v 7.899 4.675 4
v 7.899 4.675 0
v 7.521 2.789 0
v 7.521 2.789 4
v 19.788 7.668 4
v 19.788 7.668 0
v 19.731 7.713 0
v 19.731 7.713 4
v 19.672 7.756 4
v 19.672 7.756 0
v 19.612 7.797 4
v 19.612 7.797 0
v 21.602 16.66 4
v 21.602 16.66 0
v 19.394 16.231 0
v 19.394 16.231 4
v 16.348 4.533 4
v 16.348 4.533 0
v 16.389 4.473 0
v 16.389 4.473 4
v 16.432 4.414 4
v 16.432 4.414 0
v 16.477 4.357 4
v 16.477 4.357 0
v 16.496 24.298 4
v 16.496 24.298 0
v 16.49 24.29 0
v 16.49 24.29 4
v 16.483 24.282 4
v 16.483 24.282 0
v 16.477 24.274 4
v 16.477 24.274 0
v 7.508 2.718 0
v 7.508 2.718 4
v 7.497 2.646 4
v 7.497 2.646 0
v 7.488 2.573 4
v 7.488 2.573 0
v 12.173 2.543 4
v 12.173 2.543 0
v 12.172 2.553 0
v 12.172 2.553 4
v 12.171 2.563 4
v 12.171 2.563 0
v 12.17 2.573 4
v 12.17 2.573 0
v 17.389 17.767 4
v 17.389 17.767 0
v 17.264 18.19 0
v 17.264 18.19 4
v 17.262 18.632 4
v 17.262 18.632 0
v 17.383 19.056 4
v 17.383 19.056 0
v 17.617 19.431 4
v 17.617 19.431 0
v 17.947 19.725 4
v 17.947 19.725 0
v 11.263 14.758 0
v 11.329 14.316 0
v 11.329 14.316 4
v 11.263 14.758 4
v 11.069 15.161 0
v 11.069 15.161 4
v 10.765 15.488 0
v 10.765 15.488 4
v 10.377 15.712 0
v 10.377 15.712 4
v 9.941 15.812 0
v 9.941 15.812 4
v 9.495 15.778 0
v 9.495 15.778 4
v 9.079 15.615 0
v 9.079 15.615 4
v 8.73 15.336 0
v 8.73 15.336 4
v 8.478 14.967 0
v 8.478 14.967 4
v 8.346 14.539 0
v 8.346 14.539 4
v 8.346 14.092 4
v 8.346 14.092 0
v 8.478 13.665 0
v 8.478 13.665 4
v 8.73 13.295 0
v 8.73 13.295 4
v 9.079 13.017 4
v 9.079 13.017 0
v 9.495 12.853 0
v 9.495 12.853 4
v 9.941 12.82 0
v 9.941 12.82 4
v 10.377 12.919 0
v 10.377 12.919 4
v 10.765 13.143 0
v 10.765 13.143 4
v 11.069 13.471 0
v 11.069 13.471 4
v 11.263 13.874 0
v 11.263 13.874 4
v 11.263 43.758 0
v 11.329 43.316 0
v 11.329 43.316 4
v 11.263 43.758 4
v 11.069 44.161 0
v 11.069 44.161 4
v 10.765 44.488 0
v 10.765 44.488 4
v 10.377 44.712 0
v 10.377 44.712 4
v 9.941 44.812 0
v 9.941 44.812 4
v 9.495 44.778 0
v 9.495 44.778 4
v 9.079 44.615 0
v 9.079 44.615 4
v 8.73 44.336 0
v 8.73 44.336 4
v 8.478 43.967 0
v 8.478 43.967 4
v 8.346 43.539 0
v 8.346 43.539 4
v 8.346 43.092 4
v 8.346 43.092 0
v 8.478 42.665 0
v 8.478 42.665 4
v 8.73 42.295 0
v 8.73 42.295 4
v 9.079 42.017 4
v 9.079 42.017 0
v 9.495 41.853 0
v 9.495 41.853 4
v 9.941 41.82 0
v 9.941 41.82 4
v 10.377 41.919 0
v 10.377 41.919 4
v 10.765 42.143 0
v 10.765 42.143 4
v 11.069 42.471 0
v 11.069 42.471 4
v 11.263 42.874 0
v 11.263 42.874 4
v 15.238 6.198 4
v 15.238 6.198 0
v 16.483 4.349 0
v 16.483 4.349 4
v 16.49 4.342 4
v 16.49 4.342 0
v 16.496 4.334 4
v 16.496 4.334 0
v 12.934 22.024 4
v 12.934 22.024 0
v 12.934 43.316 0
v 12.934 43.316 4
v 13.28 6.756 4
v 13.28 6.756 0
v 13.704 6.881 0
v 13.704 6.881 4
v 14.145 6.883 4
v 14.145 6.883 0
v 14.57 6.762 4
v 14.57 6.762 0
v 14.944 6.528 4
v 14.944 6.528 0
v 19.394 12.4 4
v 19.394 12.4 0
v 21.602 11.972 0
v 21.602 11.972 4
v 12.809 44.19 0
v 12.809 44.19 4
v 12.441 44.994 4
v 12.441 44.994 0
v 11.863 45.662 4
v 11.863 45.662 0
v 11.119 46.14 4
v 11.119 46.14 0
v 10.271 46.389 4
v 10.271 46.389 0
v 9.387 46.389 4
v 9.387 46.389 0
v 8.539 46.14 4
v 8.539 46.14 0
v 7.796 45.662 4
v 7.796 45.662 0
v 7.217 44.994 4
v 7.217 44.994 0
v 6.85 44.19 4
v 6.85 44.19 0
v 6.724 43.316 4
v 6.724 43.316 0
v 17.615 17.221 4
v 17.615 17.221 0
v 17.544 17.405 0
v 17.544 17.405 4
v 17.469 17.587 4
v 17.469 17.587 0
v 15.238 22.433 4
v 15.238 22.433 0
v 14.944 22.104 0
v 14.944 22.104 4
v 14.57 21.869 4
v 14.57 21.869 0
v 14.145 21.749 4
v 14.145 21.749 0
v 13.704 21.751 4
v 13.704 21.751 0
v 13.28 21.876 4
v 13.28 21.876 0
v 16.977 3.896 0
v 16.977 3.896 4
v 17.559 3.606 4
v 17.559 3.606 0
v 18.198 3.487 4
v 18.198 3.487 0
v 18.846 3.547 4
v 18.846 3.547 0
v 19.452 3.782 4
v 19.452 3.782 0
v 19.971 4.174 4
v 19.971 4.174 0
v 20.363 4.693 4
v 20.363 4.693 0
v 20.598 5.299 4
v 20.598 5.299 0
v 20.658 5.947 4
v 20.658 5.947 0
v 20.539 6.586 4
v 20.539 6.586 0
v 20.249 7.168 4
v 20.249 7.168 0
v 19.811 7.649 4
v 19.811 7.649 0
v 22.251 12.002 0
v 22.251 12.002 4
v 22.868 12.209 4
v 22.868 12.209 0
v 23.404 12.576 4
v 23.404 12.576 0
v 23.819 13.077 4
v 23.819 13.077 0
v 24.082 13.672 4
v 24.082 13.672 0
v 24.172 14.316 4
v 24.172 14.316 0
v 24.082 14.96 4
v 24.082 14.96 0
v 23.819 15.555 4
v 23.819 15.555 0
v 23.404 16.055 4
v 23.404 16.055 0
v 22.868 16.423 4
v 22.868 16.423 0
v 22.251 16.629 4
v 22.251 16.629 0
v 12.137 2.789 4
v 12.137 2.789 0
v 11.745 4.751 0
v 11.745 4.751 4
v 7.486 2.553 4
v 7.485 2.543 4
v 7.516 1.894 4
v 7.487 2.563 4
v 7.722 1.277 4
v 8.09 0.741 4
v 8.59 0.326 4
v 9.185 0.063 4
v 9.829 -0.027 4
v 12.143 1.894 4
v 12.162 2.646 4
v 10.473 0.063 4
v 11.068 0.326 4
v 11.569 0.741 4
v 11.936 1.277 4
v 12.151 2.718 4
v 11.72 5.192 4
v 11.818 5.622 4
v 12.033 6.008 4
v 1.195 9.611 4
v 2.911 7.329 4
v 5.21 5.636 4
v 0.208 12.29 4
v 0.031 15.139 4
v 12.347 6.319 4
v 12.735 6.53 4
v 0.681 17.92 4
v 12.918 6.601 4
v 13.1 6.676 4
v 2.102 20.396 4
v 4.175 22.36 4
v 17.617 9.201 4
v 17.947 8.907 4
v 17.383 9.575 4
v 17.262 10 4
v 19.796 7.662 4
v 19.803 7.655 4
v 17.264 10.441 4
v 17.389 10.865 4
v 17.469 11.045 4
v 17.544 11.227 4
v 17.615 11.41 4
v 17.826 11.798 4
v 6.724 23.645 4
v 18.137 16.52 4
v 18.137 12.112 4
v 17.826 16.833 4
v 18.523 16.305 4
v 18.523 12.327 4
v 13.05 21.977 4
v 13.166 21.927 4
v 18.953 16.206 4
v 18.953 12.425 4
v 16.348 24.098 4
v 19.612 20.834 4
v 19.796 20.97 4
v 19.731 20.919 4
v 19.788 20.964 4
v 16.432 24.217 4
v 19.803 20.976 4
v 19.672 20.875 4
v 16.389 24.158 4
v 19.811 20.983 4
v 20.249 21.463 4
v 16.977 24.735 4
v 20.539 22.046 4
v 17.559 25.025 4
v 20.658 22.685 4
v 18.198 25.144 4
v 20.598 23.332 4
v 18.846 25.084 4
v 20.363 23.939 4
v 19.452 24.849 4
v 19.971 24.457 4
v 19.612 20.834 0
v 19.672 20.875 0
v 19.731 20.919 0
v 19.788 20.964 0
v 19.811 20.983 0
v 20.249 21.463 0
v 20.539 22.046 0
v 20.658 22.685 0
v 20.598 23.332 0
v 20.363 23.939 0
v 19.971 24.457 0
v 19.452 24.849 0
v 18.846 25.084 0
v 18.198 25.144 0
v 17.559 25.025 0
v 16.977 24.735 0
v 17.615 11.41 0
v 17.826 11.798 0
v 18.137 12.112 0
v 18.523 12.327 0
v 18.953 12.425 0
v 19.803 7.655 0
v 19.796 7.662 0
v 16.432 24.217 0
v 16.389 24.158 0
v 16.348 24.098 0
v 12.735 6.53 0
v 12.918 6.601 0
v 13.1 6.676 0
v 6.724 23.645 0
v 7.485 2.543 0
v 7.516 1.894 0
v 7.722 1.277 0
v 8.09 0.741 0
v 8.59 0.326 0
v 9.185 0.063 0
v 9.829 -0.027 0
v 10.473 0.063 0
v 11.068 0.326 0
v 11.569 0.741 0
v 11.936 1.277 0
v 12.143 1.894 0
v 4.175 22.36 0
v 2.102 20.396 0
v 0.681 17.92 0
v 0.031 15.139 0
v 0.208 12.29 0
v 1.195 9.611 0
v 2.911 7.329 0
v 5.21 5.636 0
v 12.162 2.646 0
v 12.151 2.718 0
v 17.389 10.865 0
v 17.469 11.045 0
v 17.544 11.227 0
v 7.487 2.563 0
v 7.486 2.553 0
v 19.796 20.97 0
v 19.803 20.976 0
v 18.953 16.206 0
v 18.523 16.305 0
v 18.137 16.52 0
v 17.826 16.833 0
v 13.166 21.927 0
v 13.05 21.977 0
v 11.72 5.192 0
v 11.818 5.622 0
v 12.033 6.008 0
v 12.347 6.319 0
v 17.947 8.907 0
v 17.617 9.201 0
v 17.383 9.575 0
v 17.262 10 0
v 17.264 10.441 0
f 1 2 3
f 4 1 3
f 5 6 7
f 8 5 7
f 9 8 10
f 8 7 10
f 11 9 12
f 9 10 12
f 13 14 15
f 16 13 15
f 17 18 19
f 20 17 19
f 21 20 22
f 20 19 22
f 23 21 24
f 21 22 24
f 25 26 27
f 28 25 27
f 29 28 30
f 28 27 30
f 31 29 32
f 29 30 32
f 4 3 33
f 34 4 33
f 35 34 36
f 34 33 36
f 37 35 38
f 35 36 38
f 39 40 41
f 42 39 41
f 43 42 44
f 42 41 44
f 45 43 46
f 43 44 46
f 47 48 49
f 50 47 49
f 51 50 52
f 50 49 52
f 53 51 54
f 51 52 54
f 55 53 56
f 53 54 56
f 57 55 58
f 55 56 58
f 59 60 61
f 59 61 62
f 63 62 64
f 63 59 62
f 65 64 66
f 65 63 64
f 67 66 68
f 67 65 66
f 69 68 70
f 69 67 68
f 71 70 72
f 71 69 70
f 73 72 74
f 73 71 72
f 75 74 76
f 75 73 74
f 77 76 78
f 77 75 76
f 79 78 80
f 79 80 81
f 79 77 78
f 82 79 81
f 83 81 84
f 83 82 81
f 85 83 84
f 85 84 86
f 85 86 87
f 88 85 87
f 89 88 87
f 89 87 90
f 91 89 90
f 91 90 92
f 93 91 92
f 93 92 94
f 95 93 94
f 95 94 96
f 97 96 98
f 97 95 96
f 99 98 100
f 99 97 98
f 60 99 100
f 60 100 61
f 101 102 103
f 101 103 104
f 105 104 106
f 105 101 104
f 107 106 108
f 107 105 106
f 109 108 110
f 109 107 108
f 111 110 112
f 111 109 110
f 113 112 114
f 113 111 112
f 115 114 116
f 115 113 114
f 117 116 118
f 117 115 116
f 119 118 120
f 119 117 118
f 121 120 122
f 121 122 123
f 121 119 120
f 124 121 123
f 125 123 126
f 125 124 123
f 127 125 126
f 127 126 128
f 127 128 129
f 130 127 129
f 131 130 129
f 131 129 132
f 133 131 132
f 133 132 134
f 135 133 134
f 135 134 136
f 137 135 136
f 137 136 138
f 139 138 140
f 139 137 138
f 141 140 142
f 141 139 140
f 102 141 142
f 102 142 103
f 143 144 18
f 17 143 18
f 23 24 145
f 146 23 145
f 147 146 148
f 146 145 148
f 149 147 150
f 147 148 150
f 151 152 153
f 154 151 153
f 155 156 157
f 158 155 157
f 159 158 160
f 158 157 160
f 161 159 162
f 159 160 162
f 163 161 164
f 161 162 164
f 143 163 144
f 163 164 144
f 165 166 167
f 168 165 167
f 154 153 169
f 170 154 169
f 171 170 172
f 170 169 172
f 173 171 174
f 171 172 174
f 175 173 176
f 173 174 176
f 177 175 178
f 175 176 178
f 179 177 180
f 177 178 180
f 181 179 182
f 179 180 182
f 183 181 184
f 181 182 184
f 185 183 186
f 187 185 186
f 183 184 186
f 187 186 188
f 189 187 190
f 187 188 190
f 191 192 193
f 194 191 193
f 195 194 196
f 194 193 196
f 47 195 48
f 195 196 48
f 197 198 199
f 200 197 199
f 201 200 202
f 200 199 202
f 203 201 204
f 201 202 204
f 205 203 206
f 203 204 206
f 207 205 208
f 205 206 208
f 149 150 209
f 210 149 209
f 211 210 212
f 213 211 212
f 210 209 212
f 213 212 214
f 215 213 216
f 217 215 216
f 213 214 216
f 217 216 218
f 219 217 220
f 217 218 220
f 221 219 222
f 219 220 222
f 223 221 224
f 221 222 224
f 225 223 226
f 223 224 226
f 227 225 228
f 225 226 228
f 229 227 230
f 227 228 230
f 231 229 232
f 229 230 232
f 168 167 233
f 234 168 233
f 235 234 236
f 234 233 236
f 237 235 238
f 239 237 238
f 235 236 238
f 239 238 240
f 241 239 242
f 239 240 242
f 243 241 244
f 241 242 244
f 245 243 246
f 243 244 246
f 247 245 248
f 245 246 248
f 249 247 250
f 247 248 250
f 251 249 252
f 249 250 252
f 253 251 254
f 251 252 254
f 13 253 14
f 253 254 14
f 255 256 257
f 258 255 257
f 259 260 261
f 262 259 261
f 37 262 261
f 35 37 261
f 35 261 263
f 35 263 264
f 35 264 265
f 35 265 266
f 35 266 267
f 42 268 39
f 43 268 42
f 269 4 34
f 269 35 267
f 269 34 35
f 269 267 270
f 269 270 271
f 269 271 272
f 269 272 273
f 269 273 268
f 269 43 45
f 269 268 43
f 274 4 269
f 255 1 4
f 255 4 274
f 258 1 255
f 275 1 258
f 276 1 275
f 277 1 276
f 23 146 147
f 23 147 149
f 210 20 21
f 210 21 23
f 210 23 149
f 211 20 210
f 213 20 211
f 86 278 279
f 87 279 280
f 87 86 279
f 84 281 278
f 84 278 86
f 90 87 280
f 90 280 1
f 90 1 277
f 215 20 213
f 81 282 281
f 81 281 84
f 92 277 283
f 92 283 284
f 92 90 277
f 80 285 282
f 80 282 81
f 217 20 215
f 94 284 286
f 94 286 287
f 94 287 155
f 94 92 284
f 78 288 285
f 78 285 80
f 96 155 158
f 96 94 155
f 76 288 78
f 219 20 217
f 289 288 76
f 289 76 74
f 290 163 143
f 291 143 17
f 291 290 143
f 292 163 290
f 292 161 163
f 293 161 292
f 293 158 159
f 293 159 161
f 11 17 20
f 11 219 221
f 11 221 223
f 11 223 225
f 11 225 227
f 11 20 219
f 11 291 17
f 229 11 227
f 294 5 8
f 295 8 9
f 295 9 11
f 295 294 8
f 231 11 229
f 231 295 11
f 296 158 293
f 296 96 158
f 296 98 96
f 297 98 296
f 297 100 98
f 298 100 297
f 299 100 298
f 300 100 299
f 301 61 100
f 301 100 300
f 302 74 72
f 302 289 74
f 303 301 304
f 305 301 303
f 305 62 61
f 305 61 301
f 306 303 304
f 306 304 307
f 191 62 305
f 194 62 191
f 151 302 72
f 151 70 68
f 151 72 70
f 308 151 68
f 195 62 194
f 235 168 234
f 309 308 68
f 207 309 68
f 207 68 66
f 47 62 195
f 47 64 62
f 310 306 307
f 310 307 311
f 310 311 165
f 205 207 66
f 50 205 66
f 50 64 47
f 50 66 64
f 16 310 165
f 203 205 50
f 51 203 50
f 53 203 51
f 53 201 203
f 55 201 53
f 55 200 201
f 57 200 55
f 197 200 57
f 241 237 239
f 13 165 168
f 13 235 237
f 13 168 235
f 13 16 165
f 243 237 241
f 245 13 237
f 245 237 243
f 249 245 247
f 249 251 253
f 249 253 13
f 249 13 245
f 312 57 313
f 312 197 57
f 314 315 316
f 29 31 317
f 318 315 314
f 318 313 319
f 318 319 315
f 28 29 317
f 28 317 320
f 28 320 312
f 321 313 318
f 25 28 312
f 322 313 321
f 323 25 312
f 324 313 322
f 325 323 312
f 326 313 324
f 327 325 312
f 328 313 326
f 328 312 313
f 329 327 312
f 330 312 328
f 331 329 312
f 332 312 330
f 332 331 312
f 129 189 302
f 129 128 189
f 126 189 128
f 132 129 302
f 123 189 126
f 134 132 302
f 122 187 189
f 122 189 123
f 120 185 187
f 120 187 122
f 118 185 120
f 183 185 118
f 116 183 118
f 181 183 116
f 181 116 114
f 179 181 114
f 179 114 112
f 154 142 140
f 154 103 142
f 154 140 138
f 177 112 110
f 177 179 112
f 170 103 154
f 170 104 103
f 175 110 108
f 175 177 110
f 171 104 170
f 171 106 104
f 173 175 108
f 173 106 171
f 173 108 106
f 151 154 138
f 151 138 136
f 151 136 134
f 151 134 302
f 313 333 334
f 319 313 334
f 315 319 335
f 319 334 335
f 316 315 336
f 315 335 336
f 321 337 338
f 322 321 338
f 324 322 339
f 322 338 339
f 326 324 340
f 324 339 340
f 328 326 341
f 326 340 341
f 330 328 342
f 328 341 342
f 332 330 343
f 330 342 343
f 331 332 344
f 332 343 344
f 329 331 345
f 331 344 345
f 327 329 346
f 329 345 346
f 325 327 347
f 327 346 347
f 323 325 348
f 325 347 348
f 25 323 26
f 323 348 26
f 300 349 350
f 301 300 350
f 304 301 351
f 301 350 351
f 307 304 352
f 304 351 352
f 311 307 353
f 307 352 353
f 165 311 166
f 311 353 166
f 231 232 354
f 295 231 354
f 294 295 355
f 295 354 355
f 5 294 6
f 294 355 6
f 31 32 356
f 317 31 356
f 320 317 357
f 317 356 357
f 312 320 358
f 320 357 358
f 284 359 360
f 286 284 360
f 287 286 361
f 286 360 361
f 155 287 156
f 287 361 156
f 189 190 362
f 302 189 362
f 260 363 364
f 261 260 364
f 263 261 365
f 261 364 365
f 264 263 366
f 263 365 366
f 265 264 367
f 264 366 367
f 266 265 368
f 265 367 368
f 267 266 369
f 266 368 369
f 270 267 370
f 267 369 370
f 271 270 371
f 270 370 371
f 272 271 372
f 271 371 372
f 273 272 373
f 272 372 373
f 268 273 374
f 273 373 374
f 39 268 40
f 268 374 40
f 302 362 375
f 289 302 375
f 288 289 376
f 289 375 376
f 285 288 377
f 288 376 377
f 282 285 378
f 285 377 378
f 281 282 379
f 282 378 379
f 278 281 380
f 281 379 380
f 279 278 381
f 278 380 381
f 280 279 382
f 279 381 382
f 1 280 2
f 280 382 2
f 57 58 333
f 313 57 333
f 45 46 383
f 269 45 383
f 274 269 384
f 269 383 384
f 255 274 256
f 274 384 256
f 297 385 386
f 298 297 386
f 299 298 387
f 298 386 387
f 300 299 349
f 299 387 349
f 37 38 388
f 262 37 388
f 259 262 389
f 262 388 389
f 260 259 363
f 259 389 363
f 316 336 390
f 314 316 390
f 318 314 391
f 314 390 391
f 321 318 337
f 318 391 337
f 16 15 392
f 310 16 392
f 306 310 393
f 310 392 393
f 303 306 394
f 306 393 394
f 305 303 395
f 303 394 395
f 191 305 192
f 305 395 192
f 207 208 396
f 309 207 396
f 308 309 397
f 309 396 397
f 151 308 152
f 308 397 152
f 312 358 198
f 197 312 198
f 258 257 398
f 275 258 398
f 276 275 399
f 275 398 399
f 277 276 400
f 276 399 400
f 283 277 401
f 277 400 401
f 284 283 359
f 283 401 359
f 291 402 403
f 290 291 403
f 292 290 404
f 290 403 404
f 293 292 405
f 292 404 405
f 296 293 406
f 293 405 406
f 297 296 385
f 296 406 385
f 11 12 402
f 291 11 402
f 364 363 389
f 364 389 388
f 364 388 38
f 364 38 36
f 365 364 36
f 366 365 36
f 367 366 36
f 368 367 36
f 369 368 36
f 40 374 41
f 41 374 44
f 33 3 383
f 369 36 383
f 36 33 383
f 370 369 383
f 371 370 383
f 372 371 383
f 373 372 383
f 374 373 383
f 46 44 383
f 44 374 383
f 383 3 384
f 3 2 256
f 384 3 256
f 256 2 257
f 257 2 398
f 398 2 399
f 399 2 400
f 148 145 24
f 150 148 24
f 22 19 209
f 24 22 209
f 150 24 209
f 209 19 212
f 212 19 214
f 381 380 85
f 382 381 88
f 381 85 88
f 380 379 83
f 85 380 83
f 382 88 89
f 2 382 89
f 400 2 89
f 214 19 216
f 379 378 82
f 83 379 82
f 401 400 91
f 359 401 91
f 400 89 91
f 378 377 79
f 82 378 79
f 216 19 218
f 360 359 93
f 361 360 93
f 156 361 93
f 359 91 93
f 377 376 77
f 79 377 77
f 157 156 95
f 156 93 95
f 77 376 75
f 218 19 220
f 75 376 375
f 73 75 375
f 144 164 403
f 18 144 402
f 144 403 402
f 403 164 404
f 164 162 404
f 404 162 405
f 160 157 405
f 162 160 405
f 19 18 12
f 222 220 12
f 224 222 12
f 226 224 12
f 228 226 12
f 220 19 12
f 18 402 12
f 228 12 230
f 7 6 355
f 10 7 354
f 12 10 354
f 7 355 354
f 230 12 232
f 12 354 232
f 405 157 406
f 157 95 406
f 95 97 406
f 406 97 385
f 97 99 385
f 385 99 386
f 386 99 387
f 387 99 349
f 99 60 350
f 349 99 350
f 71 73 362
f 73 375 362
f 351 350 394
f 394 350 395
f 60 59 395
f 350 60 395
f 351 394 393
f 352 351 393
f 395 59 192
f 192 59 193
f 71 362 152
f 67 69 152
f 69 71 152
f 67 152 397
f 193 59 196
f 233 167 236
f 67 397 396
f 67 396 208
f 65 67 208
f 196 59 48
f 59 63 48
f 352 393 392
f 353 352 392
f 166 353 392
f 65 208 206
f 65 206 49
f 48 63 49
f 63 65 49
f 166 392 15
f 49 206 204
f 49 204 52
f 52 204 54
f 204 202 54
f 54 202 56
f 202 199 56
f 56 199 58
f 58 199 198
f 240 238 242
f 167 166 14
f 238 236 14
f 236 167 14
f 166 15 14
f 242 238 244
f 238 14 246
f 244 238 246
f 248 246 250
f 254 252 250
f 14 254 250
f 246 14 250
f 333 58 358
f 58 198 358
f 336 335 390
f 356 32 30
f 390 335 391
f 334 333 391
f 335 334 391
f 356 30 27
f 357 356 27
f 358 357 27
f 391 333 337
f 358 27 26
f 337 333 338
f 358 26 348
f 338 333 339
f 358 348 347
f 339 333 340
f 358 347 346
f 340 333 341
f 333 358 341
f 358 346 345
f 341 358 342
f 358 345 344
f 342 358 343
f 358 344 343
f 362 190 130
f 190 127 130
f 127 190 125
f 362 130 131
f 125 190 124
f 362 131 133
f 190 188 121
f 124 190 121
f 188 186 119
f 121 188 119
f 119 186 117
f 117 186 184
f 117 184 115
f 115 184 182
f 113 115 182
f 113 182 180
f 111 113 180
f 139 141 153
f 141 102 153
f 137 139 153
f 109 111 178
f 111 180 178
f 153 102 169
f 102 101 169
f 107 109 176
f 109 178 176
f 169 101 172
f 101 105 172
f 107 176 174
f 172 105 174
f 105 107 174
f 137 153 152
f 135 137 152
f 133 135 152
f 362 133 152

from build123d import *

# Parameters (mm, degrees)
SKETCH1_R           = 1.5
BOSS_EXTRUDE1_DEPTH = 4


with BuildPart() as part:
    # Sketch1 → Boss-Extrude1 (new body)
    with BuildSketch(Plane.XY):
        with BuildLine():
            Line((15.238123377, 6.19825268), (16.347575878, 4.533215952))
            ThreePointArc((16.347575878, 4.533215952), (16.410300459, 4.443659946), (16.477115989, 4.357113217))
            ThreePointArc((16.477115989, 4.357113217), (16.486629929, 4.345440812), (16.496218344, 4.333829508))
            ThreePointArc((16.496218344, 4.333829508), (19.970988274, 4.173992248), (19.811151014, 7.648762179))
            ThreePointArc((19.811151014, 7.648762179), (19.79953971, 7.658350594), (19.787867306, 7.667864534))
            ThreePointArc((19.787867306, 7.667864534), (19.701320577, 7.734680065), (19.61176457, 7.797404645))
            Line((19.61176457, 7.797404645), (17.946727843, 8.906857145))
            ThreePointArc((17.946727843, 8.906857145), (17.307596881, 9.783053451), (17.389325425, 10.864501))
            ThreePointArc((17.389325425, 10.864501), (17.507217214, 11.135394708), (17.61540591, 11.410307569))
            ThreePointArc((17.61540591, 11.410307569), (18.322313997, 12.232797271), (19.393812184, 12.400427786))
            Line((19.393812184, 12.400427786), (21.601765932, 11.971688999))
            ThreePointArc((21.601765932, 11.971688999), (24.171821324, 14.31570037), (21.601765932, 16.65971174))
            Line((21.601765932, 16.65971174), (19.393812182, 16.230972956))
            ThreePointArc((19.393812182, 16.230972956), (18.322313995, 16.398603469), (17.615405908, 17.221093173))
            ThreePointArc((17.615405908, 17.221093173), (17.507217213, 17.496006033), (17.389325429, 17.766899742))
            ThreePointArc((17.389325429, 17.766899742), (17.307596884, 18.848347289), (17.946727842, 19.724543597))
            Line((17.946727842, 19.724543597), (19.61176457, 20.833996096))
            ThreePointArc((19.61176457, 20.833996096), (19.701320577, 20.896720677), (19.787867306, 20.963536208))
            ThreePointArc((19.787867306, 20.963536208), (19.79953971, 20.973050148), (19.811151014, 20.982638563))
            ThreePointArc((19.811151014, 20.982638563), (19.970988274, 24.457408494), (16.496218344, 24.297571234))
            ThreePointArc((16.496218344, 24.297571234), (16.486629929, 24.28595993), (16.477115989, 24.274287526))
            ThreePointArc((16.477115989, 24.274287526), (16.410300458, 24.187740797), (16.347575878, 24.09818479))
            Line((16.347575878, 24.09818479), (15.238123378, 22.433148063))
            ThreePointArc((15.238123378, 22.433148063), (14.36192707, 21.794017099), (13.280479519, 21.875745645))
            ThreePointArc((13.280479519, 21.875745645), (13.108222359, 21.952034546), (12.93428015, 22.024399135))
            Line((12.93428015, 22.024399135), (12.93428015, 43.31570037))
            ThreePointArc((12.93428015, 43.31570037), (9.82928015, 46.42070037), (6.72428015, 43.31570037))
            Line((6.72428015, 43.31570037), (6.72428015, 23.645064295))
            ThreePointArc((6.72428015, 23.645064295), (0.015567267, 13.708167902), (7.898674921, 4.674599826))
            Line((7.898674921, 4.674599826), (7.521150189, 2.789308191))
            ThreePointArc((7.521150189, 2.789308191), (7.502177507, 2.681629554), (7.488225443, 2.57318606))
            ThreePointArc((7.488225443, 2.57318606), (7.486699178, 2.558205052), (7.485268779, 2.543214587))
            ThreePointArc((7.485268779, 2.543214587), (9.82928015, -0.026840804), (12.173291521, 2.543214587))
            ThreePointArc((12.173291521, 2.543214587), (12.171861122, 2.558205052), (12.170334857, 2.57318606))
            ThreePointArc((12.170334857, 2.57318606), (12.156382793, 2.681629555), (12.137410113, 2.789308193))
            Line((12.137410113, 2.789308193), (11.744552736, 4.751168341))
            ThreePointArc((11.744552736, 4.751168341), (11.912183252, 5.822666526), (12.734672953, 6.529574612))
            ThreePointArc((12.734672953, 6.529574612), (13.009585814, 6.637763307), (13.280479523, 6.755655094))
            ThreePointArc((13.280479523, 6.755655094), (14.361927069, 6.837383639), (15.238123377, 6.19825268))
        make_face()
        with Locations((9.82928015, 14.31570037)):
            Circle(SKETCH1_R, mode=Mode.SUBTRACT)
        with Locations((9.82928015, 43.31570037)):
            Circle(SKETCH1_R, mode=Mode.SUBTRACT)
    extrude(amount=BOSS_EXTRUDE1_DEPTH)


solid = part.part
